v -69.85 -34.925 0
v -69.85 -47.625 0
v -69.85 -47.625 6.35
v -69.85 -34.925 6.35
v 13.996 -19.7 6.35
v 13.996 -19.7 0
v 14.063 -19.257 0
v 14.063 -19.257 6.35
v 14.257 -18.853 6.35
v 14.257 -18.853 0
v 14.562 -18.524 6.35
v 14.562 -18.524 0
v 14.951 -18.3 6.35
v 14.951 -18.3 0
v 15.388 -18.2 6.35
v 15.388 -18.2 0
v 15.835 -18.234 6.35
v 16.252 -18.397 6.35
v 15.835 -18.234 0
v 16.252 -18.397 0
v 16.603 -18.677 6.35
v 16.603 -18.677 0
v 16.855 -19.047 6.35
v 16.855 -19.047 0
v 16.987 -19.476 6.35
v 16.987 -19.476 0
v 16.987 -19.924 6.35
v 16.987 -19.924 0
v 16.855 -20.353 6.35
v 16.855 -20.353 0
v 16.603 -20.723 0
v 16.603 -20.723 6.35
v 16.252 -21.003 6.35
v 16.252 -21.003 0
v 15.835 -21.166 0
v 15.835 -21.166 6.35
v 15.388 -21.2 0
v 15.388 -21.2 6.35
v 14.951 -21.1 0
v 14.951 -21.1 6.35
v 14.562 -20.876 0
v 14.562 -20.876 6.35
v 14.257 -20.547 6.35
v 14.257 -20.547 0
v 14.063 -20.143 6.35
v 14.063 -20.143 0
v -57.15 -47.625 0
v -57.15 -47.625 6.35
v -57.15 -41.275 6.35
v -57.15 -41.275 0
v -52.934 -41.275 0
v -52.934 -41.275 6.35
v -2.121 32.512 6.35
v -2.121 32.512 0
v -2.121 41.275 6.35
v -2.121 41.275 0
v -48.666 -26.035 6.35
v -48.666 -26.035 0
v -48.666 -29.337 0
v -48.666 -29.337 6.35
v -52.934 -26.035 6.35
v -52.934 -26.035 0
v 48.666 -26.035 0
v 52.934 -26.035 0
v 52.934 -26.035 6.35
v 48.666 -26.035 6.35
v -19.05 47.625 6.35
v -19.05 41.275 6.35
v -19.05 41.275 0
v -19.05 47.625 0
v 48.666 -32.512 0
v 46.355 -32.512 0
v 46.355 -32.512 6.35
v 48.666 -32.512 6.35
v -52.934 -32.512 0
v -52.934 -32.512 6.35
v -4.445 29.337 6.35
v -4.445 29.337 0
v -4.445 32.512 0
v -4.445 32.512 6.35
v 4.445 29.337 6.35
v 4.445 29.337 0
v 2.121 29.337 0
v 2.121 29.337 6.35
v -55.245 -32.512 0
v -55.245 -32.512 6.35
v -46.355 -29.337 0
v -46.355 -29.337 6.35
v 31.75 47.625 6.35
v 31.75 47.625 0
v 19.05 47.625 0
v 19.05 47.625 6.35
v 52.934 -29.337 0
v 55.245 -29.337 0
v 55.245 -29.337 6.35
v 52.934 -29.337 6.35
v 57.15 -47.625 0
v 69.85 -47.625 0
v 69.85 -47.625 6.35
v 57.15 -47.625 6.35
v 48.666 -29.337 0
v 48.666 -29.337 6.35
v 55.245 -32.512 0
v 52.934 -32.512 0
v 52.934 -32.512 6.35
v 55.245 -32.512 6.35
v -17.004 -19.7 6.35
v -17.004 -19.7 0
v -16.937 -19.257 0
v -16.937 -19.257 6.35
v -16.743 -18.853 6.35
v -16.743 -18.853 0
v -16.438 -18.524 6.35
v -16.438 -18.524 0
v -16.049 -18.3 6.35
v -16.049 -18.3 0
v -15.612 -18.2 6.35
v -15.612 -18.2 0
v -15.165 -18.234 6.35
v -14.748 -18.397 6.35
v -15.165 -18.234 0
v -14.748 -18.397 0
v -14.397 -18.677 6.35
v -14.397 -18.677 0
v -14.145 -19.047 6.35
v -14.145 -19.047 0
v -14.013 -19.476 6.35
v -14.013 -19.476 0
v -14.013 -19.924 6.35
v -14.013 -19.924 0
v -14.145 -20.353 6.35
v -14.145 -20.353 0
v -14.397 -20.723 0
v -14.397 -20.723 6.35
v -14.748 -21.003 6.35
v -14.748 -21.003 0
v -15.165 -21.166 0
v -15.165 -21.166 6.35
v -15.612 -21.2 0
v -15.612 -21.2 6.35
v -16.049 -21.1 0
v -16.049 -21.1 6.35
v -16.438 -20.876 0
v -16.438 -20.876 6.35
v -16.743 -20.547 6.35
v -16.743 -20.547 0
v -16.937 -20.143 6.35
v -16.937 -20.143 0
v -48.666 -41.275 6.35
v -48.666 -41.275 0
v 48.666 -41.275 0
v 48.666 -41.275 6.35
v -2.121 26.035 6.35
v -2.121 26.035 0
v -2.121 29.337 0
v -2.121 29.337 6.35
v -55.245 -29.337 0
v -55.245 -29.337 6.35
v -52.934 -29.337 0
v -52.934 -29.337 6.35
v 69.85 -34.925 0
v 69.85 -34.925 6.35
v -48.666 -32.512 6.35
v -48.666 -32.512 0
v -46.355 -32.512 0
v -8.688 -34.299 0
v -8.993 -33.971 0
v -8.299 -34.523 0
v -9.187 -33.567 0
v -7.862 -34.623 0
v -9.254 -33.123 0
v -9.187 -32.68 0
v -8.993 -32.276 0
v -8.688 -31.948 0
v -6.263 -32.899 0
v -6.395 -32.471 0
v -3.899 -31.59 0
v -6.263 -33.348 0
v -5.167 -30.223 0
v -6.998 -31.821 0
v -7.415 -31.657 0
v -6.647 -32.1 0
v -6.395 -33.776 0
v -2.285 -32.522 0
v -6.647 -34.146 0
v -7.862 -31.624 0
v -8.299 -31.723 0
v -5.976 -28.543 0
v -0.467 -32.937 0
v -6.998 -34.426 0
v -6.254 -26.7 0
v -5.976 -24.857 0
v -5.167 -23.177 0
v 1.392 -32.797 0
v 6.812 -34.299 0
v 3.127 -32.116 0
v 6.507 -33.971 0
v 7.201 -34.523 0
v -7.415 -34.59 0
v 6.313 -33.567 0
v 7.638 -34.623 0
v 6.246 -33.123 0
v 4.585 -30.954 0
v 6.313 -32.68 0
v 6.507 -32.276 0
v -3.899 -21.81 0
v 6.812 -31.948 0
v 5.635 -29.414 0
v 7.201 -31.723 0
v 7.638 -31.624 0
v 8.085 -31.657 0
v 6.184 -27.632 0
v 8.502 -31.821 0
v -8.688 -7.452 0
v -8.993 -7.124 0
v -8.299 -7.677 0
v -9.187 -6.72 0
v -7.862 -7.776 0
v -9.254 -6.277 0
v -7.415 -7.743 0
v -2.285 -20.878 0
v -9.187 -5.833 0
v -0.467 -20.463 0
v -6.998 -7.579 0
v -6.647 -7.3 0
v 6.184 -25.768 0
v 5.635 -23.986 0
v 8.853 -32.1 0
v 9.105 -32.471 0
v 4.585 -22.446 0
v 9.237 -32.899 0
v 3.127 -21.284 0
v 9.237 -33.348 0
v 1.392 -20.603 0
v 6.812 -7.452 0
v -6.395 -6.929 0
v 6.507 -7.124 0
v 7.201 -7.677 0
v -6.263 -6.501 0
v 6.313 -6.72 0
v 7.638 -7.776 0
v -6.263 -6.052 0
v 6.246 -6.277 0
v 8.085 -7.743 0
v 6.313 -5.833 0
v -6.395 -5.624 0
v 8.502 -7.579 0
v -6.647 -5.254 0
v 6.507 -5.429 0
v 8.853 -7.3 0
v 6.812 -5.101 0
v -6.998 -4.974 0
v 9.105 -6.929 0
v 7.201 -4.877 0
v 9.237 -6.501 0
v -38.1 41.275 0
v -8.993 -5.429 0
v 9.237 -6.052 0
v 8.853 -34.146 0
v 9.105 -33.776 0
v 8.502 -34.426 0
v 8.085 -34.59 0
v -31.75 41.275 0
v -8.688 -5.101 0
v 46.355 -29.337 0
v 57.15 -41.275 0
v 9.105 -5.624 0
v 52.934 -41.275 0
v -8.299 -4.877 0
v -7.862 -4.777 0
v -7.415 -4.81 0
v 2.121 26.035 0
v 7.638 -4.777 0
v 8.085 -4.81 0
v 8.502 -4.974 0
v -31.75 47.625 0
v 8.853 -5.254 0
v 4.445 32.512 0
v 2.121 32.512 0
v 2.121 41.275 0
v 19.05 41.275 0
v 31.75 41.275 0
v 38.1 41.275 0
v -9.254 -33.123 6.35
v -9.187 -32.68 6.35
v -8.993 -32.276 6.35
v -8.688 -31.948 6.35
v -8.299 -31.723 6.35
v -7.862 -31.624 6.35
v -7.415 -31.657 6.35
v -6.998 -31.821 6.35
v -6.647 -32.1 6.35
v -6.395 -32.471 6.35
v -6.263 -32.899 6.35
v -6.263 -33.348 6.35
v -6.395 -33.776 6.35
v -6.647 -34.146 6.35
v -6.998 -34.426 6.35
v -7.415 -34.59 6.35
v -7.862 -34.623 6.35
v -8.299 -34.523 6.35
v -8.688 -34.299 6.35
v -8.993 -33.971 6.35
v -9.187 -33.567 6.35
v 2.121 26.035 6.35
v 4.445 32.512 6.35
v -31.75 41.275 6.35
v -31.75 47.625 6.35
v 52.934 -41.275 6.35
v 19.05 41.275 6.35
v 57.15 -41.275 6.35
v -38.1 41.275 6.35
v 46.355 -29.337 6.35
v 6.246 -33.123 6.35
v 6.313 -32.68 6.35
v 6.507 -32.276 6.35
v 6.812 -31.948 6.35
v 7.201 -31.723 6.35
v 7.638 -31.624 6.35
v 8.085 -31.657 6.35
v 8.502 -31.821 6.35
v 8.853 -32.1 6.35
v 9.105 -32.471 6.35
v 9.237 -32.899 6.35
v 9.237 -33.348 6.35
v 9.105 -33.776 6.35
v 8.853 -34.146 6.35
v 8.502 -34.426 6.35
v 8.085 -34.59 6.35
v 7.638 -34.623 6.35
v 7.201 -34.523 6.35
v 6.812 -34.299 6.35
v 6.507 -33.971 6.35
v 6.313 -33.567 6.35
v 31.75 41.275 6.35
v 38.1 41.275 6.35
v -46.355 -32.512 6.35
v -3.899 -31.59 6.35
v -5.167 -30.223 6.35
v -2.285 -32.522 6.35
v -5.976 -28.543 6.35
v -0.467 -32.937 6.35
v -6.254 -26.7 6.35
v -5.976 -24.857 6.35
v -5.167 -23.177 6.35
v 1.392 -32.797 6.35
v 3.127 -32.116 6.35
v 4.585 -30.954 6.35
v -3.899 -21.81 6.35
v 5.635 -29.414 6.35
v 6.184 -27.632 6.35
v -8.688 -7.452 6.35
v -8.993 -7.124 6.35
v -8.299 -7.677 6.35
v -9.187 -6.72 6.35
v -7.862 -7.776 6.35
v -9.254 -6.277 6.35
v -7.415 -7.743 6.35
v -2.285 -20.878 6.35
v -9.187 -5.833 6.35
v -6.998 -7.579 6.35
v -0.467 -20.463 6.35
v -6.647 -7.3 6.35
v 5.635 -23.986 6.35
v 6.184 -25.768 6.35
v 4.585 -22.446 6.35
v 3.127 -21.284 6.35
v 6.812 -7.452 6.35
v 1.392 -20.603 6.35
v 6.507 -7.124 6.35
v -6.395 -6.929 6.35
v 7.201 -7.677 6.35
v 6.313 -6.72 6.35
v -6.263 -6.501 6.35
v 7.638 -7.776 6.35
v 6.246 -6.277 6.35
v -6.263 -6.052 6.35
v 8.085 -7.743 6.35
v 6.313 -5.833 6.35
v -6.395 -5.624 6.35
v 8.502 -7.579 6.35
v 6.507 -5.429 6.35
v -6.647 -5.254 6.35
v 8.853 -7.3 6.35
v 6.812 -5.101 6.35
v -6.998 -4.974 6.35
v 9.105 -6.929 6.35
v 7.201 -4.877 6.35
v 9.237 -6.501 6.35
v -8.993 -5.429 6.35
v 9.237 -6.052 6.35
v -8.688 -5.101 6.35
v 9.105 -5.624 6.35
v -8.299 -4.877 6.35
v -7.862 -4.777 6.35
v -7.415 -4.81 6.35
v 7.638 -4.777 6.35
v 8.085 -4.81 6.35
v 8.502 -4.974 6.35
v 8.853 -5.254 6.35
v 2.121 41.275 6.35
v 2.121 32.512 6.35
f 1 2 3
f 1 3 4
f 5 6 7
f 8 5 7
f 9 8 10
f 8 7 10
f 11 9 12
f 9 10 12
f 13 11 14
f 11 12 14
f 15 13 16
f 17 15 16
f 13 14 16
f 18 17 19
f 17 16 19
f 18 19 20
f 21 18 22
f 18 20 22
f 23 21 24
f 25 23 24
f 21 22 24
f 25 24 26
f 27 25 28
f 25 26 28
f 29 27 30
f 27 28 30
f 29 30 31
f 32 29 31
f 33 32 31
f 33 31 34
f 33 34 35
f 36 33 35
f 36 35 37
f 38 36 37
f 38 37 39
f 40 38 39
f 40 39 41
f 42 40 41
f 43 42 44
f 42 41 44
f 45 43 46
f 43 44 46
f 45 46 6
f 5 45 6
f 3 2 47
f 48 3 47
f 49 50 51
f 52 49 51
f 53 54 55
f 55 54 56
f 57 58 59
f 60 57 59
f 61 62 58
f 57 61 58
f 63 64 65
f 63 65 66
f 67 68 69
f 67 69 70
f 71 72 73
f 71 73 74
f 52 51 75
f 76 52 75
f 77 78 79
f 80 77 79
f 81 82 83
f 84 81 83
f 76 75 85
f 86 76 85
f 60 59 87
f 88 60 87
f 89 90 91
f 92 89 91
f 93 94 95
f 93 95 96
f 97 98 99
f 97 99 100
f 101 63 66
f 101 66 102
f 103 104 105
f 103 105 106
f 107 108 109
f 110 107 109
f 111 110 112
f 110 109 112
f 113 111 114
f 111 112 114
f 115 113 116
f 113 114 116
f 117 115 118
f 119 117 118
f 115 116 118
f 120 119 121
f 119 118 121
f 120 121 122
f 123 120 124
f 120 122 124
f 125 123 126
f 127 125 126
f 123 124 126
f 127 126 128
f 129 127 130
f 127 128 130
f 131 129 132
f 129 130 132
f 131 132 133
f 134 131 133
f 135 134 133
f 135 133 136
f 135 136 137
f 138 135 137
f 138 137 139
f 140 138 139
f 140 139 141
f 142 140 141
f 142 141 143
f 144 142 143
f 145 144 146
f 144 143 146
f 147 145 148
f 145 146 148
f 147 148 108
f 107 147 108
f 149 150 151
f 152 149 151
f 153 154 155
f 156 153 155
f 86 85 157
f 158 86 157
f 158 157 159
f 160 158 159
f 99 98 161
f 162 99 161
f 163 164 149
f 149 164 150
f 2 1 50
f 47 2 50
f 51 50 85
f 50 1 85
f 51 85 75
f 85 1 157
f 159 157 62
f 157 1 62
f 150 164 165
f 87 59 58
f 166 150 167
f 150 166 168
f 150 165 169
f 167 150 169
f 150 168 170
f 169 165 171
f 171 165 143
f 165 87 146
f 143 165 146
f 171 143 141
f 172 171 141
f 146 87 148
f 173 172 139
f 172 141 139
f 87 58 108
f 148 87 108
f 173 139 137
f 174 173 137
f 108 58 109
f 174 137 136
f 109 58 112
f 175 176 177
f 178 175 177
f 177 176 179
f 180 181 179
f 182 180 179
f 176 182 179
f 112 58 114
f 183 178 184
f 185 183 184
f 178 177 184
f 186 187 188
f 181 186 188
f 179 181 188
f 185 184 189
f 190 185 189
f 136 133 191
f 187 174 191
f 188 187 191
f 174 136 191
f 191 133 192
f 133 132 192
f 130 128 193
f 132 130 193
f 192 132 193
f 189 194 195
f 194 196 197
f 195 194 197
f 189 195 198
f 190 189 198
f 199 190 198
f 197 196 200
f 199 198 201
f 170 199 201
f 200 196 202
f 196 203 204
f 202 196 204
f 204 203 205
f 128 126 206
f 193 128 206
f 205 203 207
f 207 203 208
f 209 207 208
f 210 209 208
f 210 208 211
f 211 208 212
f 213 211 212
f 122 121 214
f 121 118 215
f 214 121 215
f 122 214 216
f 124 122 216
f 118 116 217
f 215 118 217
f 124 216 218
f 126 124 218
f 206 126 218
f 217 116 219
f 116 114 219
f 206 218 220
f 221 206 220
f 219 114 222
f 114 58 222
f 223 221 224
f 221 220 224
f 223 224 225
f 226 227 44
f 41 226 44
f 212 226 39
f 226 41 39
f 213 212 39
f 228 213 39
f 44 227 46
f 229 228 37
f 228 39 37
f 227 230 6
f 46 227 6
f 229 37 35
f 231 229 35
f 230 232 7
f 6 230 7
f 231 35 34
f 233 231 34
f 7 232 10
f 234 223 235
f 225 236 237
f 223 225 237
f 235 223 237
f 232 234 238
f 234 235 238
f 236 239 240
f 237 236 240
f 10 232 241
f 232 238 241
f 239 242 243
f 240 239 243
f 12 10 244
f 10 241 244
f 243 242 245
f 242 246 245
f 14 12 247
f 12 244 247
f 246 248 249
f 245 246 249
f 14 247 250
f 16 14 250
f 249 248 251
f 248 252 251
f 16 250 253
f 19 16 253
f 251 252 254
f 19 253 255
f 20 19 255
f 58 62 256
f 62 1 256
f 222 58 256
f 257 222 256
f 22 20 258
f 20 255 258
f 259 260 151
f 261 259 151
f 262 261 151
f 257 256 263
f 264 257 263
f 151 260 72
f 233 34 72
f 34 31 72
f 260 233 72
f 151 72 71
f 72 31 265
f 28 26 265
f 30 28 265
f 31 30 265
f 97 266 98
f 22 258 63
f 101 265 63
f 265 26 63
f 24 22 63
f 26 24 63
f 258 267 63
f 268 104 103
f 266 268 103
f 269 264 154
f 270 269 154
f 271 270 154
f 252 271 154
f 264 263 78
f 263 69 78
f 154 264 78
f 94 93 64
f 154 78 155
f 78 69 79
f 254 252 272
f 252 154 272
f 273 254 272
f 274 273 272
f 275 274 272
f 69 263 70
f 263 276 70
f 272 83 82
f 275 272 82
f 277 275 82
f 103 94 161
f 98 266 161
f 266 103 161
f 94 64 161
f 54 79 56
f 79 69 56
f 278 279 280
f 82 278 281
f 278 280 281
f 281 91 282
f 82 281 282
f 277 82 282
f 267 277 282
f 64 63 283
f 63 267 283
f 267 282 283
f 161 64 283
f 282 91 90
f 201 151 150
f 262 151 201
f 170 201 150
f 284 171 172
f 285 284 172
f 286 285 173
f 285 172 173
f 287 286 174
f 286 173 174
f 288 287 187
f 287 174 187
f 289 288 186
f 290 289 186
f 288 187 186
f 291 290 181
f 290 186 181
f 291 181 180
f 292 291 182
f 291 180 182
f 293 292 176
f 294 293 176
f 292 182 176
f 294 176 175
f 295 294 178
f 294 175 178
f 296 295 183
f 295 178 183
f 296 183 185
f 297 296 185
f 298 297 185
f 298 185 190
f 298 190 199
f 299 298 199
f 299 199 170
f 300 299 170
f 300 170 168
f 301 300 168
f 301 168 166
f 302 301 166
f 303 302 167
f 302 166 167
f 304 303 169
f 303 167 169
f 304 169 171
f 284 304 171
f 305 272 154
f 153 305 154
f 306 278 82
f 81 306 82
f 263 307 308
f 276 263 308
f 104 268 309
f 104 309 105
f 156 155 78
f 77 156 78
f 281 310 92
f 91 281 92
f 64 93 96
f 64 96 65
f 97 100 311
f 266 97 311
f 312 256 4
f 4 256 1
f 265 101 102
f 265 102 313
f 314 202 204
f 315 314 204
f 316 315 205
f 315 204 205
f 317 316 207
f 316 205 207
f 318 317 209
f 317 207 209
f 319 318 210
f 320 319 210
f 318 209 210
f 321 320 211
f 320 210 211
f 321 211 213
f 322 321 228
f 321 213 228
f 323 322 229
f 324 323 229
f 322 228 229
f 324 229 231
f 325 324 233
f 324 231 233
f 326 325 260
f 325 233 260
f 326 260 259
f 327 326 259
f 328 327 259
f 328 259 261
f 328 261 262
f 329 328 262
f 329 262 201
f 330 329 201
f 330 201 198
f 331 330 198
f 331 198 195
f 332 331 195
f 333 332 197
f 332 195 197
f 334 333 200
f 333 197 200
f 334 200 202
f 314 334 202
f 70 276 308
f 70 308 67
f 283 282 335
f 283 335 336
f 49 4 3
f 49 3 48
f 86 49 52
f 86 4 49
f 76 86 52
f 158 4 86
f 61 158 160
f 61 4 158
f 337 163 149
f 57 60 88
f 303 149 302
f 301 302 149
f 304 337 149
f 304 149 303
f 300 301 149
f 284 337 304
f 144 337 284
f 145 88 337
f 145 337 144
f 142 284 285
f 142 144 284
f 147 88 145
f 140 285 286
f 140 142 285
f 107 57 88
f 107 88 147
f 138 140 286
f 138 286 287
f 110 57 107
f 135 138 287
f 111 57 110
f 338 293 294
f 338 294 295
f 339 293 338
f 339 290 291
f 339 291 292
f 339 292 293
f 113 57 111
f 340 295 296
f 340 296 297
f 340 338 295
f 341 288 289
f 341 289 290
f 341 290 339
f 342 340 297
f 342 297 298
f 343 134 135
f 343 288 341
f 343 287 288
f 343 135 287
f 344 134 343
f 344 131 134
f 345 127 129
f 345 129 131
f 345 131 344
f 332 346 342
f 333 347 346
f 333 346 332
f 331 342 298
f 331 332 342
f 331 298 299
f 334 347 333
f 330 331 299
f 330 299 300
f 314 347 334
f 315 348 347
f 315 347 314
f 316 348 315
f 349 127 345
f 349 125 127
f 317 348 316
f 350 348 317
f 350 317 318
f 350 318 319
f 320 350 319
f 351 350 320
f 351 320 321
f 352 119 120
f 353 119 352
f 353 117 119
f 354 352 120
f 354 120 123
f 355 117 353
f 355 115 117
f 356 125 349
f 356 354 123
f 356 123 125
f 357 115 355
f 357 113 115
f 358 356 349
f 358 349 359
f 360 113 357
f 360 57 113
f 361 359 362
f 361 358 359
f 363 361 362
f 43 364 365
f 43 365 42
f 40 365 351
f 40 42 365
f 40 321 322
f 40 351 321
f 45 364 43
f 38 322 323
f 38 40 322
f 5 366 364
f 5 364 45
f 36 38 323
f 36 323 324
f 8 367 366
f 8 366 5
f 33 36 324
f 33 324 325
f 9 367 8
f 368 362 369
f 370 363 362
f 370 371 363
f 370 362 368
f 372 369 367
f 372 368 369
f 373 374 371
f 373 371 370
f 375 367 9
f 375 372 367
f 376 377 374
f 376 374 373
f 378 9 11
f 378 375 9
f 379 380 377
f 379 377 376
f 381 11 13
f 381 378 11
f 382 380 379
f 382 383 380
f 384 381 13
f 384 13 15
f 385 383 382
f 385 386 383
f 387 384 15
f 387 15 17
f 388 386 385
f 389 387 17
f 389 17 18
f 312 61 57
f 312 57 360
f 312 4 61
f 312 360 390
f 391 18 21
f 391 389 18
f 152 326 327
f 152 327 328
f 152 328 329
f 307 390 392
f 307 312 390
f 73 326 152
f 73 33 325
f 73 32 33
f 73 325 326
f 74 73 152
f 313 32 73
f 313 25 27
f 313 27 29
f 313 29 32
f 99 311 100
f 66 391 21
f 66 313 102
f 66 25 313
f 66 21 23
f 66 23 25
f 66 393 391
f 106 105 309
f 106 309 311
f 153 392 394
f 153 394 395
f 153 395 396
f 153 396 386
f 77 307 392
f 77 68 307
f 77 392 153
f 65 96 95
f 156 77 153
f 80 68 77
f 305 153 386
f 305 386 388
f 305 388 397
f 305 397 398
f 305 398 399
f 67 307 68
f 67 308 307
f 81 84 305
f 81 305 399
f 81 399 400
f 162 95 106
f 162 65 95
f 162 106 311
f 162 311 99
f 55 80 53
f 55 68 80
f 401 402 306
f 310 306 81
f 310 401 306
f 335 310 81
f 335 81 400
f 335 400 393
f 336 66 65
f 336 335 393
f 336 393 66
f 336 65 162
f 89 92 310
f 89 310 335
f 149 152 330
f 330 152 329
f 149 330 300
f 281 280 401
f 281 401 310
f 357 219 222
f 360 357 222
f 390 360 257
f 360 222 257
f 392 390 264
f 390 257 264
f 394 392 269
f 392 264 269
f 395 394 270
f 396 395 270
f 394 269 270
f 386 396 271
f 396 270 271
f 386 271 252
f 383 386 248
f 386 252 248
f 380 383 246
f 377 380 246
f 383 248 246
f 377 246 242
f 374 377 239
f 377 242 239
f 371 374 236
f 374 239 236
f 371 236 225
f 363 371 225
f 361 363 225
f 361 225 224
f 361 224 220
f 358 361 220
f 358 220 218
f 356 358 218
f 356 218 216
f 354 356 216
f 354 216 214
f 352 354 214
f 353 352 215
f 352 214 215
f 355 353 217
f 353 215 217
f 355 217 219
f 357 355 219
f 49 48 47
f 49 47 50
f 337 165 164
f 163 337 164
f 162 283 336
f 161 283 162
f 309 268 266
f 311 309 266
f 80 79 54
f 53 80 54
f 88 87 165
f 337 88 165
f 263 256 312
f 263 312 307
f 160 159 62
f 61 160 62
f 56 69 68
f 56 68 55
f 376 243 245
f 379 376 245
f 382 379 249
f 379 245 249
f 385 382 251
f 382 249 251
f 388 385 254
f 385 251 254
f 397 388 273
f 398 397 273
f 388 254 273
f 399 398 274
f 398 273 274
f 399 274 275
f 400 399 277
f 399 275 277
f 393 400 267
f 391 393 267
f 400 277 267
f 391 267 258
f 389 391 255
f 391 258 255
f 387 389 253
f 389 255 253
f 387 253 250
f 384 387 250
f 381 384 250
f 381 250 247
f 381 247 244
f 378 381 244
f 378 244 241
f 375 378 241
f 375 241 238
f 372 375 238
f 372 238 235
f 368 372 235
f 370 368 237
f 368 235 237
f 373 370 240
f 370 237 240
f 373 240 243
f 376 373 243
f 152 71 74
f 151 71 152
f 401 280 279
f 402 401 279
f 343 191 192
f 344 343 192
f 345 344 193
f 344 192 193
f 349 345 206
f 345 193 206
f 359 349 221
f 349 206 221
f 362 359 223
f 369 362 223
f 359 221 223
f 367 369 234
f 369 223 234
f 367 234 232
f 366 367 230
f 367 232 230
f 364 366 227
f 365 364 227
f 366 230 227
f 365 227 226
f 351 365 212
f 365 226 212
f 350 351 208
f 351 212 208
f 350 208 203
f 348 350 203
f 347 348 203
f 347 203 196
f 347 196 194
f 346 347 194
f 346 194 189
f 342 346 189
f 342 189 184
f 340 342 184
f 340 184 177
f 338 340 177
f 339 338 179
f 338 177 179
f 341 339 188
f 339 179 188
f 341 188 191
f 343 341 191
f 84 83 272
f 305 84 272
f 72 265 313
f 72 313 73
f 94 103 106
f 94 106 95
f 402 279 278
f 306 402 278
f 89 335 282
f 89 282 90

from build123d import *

# Parameters (mm, degrees)
SKETCH1_W           = 139.7
SKETCH1_H           = 82.55
BOSS_EXTRUDE1_DEPTH = 6.35
SKETCH2_W           = 12.7
SKETCH2_H           = 6.35
BOSS_EXTRUDE2_DEPTH = 6.35
CUT_EXTRUDE1_DEPTH  = 6.35
CUT_EXTRUDE8_DEPTH  = 6.35
CUT_EXTRUDE2_DEPTH  = 6.35
SKETCH5_R           = 6.254
SKETCH5_R_2         = 1.504
CUT_EXTRUDE9_DEPTH  = 6.35


with BuildPart() as part:
    # Sketch1 → Boss-Extrude1 (new body)
    with BuildSketch(Plane.XY):
        Rectangle(SKETCH1_W, SKETCH1_H)
    extrude(amount=BOSS_EXTRUDE1_DEPTH)

    # Sketch2 → Boss-Extrude2 (add)
    with BuildSketch(Plane(origin=(0, 0, 0), x_dir=(-1, 0, 0), z_dir=(0, 0, -1))):
        with Locations((-63.5, -44.45)):
            Rectangle(SKETCH2_W, SKETCH2_H)
        with Locations((-25.4, 44.45)):
            Rectangle(SKETCH2_W, SKETCH2_H)
    boss_extrude2 = extrude(amount=-BOSS_EXTRUDE2_DEPTH)

    # Sketch3 → Cut-Extrude1 (cut)
    with BuildSketch(Plane(origin=(0, 0, 0), x_dir=(-1, 0, 0), z_dir=(0, 0, -1))):
        Polygon((-52.9336, -41.275), (-52.9336, -32.512), (-55.245, -32.512), (-55.245, -29.337), (-52.9336, -29.337), (-52.9336, -26.035), (-48.6664, -26.035), (-48.6664, -29.337), (-46.355, -29.337), (-46.355, -32.512), (-48.6664, -32.512), (-48.6664, -41.275), align=None)
    cut_extrude1 = extrude(amount=-CUT_EXTRUDE1_DEPTH, mode=Mode.SUBTRACT)

    # Sketch7 → Cut-Extrude8 (cut)
    with BuildSketch(Plane(origin=(0, 0, 0), x_dir=(-1, 0, 0), z_dir=(0, 0, -1))):
        Polygon((-38.1, 41.275), (-69.85, -34.925), (-69.85, 41.275), align=None)
    cut_extrude8 = extrude(amount=-CUT_EXTRUDE8_DEPTH, mode=Mode.SUBTRACT)

    # Mirror2: Boss-Extrude2, Cut-Extrude8 across plane
    add(boss_extrude2.mirror(Plane(origin=(0, 0, 0), x_dir=(0, 0, 1), z_dir=(1, 0, 0))))
    add(cut_extrude8.mirror(Plane(origin=(0, 0, 0), x_dir=(0, 0, 1), z_dir=(1, 0, 0))), mode=Mode.SUBTRACT)

    # Mirror4: Cut-Extrude1 across plane
    add(cut_extrude1.mirror(Plane(origin=(0, 0, 0), x_dir=(0, 0, 1), z_dir=(1, 0, 0))), mode=Mode.SUBTRACT)

    # Sketch4 → Cut-Extrude2 (cut)
    with BuildSketch(Plane(origin=(0, 0, 0), x_dir=(-1, 0, 0), z_dir=(0, 0, -1))):
        Polygon((2.1209, 41.275), (-2.1209, 41.275), (-2.1209, 32.512), (-4.445, 32.512), (-4.445, 29.337), (-2.1209, 29.337), (-2.1209, 26.035), (2.1209, 26.035), (2.1209, 29.337), (4.445, 29.337), (4.445, 32.512), (2.1209, 32.512), align=None)
    extrude(amount=-CUT_EXTRUDE2_DEPTH, mode=Mode.SUBTRACT)

    # Sketch5 → Cut-Extrude9 (cut)
    with BuildSketch(Plane(origin=(0, 0, 0), x_dir=(-1, 0, 0), z_dir=(0, 0, -1))):
        with Locations((0, -26.7)):
            Circle(SKETCH5_R)
        with Locations((-15.5, -19.7)):
            Circle(SKETCH5_R_2)
        with Locations((-7.75, -6.276606241)):
            Circle(SKETCH5_R_2)
        with Locations((7.75, -6.276606241)):
            Circle(SKETCH5_R_2)
        with Locations((15.5, -19.7)):
            Circle(SKETCH5_R_2)
        with Locations((7.75, -33.123393759)):
            Circle(SKETCH5_R_2)
        with Locations((-7.75, -33.123393759)):
            Circle(SKETCH5_R_2)
    extrude(amount=-CUT_EXTRUDE9_DEPTH, mode=Mode.SUBTRACT)


solid = part.part
